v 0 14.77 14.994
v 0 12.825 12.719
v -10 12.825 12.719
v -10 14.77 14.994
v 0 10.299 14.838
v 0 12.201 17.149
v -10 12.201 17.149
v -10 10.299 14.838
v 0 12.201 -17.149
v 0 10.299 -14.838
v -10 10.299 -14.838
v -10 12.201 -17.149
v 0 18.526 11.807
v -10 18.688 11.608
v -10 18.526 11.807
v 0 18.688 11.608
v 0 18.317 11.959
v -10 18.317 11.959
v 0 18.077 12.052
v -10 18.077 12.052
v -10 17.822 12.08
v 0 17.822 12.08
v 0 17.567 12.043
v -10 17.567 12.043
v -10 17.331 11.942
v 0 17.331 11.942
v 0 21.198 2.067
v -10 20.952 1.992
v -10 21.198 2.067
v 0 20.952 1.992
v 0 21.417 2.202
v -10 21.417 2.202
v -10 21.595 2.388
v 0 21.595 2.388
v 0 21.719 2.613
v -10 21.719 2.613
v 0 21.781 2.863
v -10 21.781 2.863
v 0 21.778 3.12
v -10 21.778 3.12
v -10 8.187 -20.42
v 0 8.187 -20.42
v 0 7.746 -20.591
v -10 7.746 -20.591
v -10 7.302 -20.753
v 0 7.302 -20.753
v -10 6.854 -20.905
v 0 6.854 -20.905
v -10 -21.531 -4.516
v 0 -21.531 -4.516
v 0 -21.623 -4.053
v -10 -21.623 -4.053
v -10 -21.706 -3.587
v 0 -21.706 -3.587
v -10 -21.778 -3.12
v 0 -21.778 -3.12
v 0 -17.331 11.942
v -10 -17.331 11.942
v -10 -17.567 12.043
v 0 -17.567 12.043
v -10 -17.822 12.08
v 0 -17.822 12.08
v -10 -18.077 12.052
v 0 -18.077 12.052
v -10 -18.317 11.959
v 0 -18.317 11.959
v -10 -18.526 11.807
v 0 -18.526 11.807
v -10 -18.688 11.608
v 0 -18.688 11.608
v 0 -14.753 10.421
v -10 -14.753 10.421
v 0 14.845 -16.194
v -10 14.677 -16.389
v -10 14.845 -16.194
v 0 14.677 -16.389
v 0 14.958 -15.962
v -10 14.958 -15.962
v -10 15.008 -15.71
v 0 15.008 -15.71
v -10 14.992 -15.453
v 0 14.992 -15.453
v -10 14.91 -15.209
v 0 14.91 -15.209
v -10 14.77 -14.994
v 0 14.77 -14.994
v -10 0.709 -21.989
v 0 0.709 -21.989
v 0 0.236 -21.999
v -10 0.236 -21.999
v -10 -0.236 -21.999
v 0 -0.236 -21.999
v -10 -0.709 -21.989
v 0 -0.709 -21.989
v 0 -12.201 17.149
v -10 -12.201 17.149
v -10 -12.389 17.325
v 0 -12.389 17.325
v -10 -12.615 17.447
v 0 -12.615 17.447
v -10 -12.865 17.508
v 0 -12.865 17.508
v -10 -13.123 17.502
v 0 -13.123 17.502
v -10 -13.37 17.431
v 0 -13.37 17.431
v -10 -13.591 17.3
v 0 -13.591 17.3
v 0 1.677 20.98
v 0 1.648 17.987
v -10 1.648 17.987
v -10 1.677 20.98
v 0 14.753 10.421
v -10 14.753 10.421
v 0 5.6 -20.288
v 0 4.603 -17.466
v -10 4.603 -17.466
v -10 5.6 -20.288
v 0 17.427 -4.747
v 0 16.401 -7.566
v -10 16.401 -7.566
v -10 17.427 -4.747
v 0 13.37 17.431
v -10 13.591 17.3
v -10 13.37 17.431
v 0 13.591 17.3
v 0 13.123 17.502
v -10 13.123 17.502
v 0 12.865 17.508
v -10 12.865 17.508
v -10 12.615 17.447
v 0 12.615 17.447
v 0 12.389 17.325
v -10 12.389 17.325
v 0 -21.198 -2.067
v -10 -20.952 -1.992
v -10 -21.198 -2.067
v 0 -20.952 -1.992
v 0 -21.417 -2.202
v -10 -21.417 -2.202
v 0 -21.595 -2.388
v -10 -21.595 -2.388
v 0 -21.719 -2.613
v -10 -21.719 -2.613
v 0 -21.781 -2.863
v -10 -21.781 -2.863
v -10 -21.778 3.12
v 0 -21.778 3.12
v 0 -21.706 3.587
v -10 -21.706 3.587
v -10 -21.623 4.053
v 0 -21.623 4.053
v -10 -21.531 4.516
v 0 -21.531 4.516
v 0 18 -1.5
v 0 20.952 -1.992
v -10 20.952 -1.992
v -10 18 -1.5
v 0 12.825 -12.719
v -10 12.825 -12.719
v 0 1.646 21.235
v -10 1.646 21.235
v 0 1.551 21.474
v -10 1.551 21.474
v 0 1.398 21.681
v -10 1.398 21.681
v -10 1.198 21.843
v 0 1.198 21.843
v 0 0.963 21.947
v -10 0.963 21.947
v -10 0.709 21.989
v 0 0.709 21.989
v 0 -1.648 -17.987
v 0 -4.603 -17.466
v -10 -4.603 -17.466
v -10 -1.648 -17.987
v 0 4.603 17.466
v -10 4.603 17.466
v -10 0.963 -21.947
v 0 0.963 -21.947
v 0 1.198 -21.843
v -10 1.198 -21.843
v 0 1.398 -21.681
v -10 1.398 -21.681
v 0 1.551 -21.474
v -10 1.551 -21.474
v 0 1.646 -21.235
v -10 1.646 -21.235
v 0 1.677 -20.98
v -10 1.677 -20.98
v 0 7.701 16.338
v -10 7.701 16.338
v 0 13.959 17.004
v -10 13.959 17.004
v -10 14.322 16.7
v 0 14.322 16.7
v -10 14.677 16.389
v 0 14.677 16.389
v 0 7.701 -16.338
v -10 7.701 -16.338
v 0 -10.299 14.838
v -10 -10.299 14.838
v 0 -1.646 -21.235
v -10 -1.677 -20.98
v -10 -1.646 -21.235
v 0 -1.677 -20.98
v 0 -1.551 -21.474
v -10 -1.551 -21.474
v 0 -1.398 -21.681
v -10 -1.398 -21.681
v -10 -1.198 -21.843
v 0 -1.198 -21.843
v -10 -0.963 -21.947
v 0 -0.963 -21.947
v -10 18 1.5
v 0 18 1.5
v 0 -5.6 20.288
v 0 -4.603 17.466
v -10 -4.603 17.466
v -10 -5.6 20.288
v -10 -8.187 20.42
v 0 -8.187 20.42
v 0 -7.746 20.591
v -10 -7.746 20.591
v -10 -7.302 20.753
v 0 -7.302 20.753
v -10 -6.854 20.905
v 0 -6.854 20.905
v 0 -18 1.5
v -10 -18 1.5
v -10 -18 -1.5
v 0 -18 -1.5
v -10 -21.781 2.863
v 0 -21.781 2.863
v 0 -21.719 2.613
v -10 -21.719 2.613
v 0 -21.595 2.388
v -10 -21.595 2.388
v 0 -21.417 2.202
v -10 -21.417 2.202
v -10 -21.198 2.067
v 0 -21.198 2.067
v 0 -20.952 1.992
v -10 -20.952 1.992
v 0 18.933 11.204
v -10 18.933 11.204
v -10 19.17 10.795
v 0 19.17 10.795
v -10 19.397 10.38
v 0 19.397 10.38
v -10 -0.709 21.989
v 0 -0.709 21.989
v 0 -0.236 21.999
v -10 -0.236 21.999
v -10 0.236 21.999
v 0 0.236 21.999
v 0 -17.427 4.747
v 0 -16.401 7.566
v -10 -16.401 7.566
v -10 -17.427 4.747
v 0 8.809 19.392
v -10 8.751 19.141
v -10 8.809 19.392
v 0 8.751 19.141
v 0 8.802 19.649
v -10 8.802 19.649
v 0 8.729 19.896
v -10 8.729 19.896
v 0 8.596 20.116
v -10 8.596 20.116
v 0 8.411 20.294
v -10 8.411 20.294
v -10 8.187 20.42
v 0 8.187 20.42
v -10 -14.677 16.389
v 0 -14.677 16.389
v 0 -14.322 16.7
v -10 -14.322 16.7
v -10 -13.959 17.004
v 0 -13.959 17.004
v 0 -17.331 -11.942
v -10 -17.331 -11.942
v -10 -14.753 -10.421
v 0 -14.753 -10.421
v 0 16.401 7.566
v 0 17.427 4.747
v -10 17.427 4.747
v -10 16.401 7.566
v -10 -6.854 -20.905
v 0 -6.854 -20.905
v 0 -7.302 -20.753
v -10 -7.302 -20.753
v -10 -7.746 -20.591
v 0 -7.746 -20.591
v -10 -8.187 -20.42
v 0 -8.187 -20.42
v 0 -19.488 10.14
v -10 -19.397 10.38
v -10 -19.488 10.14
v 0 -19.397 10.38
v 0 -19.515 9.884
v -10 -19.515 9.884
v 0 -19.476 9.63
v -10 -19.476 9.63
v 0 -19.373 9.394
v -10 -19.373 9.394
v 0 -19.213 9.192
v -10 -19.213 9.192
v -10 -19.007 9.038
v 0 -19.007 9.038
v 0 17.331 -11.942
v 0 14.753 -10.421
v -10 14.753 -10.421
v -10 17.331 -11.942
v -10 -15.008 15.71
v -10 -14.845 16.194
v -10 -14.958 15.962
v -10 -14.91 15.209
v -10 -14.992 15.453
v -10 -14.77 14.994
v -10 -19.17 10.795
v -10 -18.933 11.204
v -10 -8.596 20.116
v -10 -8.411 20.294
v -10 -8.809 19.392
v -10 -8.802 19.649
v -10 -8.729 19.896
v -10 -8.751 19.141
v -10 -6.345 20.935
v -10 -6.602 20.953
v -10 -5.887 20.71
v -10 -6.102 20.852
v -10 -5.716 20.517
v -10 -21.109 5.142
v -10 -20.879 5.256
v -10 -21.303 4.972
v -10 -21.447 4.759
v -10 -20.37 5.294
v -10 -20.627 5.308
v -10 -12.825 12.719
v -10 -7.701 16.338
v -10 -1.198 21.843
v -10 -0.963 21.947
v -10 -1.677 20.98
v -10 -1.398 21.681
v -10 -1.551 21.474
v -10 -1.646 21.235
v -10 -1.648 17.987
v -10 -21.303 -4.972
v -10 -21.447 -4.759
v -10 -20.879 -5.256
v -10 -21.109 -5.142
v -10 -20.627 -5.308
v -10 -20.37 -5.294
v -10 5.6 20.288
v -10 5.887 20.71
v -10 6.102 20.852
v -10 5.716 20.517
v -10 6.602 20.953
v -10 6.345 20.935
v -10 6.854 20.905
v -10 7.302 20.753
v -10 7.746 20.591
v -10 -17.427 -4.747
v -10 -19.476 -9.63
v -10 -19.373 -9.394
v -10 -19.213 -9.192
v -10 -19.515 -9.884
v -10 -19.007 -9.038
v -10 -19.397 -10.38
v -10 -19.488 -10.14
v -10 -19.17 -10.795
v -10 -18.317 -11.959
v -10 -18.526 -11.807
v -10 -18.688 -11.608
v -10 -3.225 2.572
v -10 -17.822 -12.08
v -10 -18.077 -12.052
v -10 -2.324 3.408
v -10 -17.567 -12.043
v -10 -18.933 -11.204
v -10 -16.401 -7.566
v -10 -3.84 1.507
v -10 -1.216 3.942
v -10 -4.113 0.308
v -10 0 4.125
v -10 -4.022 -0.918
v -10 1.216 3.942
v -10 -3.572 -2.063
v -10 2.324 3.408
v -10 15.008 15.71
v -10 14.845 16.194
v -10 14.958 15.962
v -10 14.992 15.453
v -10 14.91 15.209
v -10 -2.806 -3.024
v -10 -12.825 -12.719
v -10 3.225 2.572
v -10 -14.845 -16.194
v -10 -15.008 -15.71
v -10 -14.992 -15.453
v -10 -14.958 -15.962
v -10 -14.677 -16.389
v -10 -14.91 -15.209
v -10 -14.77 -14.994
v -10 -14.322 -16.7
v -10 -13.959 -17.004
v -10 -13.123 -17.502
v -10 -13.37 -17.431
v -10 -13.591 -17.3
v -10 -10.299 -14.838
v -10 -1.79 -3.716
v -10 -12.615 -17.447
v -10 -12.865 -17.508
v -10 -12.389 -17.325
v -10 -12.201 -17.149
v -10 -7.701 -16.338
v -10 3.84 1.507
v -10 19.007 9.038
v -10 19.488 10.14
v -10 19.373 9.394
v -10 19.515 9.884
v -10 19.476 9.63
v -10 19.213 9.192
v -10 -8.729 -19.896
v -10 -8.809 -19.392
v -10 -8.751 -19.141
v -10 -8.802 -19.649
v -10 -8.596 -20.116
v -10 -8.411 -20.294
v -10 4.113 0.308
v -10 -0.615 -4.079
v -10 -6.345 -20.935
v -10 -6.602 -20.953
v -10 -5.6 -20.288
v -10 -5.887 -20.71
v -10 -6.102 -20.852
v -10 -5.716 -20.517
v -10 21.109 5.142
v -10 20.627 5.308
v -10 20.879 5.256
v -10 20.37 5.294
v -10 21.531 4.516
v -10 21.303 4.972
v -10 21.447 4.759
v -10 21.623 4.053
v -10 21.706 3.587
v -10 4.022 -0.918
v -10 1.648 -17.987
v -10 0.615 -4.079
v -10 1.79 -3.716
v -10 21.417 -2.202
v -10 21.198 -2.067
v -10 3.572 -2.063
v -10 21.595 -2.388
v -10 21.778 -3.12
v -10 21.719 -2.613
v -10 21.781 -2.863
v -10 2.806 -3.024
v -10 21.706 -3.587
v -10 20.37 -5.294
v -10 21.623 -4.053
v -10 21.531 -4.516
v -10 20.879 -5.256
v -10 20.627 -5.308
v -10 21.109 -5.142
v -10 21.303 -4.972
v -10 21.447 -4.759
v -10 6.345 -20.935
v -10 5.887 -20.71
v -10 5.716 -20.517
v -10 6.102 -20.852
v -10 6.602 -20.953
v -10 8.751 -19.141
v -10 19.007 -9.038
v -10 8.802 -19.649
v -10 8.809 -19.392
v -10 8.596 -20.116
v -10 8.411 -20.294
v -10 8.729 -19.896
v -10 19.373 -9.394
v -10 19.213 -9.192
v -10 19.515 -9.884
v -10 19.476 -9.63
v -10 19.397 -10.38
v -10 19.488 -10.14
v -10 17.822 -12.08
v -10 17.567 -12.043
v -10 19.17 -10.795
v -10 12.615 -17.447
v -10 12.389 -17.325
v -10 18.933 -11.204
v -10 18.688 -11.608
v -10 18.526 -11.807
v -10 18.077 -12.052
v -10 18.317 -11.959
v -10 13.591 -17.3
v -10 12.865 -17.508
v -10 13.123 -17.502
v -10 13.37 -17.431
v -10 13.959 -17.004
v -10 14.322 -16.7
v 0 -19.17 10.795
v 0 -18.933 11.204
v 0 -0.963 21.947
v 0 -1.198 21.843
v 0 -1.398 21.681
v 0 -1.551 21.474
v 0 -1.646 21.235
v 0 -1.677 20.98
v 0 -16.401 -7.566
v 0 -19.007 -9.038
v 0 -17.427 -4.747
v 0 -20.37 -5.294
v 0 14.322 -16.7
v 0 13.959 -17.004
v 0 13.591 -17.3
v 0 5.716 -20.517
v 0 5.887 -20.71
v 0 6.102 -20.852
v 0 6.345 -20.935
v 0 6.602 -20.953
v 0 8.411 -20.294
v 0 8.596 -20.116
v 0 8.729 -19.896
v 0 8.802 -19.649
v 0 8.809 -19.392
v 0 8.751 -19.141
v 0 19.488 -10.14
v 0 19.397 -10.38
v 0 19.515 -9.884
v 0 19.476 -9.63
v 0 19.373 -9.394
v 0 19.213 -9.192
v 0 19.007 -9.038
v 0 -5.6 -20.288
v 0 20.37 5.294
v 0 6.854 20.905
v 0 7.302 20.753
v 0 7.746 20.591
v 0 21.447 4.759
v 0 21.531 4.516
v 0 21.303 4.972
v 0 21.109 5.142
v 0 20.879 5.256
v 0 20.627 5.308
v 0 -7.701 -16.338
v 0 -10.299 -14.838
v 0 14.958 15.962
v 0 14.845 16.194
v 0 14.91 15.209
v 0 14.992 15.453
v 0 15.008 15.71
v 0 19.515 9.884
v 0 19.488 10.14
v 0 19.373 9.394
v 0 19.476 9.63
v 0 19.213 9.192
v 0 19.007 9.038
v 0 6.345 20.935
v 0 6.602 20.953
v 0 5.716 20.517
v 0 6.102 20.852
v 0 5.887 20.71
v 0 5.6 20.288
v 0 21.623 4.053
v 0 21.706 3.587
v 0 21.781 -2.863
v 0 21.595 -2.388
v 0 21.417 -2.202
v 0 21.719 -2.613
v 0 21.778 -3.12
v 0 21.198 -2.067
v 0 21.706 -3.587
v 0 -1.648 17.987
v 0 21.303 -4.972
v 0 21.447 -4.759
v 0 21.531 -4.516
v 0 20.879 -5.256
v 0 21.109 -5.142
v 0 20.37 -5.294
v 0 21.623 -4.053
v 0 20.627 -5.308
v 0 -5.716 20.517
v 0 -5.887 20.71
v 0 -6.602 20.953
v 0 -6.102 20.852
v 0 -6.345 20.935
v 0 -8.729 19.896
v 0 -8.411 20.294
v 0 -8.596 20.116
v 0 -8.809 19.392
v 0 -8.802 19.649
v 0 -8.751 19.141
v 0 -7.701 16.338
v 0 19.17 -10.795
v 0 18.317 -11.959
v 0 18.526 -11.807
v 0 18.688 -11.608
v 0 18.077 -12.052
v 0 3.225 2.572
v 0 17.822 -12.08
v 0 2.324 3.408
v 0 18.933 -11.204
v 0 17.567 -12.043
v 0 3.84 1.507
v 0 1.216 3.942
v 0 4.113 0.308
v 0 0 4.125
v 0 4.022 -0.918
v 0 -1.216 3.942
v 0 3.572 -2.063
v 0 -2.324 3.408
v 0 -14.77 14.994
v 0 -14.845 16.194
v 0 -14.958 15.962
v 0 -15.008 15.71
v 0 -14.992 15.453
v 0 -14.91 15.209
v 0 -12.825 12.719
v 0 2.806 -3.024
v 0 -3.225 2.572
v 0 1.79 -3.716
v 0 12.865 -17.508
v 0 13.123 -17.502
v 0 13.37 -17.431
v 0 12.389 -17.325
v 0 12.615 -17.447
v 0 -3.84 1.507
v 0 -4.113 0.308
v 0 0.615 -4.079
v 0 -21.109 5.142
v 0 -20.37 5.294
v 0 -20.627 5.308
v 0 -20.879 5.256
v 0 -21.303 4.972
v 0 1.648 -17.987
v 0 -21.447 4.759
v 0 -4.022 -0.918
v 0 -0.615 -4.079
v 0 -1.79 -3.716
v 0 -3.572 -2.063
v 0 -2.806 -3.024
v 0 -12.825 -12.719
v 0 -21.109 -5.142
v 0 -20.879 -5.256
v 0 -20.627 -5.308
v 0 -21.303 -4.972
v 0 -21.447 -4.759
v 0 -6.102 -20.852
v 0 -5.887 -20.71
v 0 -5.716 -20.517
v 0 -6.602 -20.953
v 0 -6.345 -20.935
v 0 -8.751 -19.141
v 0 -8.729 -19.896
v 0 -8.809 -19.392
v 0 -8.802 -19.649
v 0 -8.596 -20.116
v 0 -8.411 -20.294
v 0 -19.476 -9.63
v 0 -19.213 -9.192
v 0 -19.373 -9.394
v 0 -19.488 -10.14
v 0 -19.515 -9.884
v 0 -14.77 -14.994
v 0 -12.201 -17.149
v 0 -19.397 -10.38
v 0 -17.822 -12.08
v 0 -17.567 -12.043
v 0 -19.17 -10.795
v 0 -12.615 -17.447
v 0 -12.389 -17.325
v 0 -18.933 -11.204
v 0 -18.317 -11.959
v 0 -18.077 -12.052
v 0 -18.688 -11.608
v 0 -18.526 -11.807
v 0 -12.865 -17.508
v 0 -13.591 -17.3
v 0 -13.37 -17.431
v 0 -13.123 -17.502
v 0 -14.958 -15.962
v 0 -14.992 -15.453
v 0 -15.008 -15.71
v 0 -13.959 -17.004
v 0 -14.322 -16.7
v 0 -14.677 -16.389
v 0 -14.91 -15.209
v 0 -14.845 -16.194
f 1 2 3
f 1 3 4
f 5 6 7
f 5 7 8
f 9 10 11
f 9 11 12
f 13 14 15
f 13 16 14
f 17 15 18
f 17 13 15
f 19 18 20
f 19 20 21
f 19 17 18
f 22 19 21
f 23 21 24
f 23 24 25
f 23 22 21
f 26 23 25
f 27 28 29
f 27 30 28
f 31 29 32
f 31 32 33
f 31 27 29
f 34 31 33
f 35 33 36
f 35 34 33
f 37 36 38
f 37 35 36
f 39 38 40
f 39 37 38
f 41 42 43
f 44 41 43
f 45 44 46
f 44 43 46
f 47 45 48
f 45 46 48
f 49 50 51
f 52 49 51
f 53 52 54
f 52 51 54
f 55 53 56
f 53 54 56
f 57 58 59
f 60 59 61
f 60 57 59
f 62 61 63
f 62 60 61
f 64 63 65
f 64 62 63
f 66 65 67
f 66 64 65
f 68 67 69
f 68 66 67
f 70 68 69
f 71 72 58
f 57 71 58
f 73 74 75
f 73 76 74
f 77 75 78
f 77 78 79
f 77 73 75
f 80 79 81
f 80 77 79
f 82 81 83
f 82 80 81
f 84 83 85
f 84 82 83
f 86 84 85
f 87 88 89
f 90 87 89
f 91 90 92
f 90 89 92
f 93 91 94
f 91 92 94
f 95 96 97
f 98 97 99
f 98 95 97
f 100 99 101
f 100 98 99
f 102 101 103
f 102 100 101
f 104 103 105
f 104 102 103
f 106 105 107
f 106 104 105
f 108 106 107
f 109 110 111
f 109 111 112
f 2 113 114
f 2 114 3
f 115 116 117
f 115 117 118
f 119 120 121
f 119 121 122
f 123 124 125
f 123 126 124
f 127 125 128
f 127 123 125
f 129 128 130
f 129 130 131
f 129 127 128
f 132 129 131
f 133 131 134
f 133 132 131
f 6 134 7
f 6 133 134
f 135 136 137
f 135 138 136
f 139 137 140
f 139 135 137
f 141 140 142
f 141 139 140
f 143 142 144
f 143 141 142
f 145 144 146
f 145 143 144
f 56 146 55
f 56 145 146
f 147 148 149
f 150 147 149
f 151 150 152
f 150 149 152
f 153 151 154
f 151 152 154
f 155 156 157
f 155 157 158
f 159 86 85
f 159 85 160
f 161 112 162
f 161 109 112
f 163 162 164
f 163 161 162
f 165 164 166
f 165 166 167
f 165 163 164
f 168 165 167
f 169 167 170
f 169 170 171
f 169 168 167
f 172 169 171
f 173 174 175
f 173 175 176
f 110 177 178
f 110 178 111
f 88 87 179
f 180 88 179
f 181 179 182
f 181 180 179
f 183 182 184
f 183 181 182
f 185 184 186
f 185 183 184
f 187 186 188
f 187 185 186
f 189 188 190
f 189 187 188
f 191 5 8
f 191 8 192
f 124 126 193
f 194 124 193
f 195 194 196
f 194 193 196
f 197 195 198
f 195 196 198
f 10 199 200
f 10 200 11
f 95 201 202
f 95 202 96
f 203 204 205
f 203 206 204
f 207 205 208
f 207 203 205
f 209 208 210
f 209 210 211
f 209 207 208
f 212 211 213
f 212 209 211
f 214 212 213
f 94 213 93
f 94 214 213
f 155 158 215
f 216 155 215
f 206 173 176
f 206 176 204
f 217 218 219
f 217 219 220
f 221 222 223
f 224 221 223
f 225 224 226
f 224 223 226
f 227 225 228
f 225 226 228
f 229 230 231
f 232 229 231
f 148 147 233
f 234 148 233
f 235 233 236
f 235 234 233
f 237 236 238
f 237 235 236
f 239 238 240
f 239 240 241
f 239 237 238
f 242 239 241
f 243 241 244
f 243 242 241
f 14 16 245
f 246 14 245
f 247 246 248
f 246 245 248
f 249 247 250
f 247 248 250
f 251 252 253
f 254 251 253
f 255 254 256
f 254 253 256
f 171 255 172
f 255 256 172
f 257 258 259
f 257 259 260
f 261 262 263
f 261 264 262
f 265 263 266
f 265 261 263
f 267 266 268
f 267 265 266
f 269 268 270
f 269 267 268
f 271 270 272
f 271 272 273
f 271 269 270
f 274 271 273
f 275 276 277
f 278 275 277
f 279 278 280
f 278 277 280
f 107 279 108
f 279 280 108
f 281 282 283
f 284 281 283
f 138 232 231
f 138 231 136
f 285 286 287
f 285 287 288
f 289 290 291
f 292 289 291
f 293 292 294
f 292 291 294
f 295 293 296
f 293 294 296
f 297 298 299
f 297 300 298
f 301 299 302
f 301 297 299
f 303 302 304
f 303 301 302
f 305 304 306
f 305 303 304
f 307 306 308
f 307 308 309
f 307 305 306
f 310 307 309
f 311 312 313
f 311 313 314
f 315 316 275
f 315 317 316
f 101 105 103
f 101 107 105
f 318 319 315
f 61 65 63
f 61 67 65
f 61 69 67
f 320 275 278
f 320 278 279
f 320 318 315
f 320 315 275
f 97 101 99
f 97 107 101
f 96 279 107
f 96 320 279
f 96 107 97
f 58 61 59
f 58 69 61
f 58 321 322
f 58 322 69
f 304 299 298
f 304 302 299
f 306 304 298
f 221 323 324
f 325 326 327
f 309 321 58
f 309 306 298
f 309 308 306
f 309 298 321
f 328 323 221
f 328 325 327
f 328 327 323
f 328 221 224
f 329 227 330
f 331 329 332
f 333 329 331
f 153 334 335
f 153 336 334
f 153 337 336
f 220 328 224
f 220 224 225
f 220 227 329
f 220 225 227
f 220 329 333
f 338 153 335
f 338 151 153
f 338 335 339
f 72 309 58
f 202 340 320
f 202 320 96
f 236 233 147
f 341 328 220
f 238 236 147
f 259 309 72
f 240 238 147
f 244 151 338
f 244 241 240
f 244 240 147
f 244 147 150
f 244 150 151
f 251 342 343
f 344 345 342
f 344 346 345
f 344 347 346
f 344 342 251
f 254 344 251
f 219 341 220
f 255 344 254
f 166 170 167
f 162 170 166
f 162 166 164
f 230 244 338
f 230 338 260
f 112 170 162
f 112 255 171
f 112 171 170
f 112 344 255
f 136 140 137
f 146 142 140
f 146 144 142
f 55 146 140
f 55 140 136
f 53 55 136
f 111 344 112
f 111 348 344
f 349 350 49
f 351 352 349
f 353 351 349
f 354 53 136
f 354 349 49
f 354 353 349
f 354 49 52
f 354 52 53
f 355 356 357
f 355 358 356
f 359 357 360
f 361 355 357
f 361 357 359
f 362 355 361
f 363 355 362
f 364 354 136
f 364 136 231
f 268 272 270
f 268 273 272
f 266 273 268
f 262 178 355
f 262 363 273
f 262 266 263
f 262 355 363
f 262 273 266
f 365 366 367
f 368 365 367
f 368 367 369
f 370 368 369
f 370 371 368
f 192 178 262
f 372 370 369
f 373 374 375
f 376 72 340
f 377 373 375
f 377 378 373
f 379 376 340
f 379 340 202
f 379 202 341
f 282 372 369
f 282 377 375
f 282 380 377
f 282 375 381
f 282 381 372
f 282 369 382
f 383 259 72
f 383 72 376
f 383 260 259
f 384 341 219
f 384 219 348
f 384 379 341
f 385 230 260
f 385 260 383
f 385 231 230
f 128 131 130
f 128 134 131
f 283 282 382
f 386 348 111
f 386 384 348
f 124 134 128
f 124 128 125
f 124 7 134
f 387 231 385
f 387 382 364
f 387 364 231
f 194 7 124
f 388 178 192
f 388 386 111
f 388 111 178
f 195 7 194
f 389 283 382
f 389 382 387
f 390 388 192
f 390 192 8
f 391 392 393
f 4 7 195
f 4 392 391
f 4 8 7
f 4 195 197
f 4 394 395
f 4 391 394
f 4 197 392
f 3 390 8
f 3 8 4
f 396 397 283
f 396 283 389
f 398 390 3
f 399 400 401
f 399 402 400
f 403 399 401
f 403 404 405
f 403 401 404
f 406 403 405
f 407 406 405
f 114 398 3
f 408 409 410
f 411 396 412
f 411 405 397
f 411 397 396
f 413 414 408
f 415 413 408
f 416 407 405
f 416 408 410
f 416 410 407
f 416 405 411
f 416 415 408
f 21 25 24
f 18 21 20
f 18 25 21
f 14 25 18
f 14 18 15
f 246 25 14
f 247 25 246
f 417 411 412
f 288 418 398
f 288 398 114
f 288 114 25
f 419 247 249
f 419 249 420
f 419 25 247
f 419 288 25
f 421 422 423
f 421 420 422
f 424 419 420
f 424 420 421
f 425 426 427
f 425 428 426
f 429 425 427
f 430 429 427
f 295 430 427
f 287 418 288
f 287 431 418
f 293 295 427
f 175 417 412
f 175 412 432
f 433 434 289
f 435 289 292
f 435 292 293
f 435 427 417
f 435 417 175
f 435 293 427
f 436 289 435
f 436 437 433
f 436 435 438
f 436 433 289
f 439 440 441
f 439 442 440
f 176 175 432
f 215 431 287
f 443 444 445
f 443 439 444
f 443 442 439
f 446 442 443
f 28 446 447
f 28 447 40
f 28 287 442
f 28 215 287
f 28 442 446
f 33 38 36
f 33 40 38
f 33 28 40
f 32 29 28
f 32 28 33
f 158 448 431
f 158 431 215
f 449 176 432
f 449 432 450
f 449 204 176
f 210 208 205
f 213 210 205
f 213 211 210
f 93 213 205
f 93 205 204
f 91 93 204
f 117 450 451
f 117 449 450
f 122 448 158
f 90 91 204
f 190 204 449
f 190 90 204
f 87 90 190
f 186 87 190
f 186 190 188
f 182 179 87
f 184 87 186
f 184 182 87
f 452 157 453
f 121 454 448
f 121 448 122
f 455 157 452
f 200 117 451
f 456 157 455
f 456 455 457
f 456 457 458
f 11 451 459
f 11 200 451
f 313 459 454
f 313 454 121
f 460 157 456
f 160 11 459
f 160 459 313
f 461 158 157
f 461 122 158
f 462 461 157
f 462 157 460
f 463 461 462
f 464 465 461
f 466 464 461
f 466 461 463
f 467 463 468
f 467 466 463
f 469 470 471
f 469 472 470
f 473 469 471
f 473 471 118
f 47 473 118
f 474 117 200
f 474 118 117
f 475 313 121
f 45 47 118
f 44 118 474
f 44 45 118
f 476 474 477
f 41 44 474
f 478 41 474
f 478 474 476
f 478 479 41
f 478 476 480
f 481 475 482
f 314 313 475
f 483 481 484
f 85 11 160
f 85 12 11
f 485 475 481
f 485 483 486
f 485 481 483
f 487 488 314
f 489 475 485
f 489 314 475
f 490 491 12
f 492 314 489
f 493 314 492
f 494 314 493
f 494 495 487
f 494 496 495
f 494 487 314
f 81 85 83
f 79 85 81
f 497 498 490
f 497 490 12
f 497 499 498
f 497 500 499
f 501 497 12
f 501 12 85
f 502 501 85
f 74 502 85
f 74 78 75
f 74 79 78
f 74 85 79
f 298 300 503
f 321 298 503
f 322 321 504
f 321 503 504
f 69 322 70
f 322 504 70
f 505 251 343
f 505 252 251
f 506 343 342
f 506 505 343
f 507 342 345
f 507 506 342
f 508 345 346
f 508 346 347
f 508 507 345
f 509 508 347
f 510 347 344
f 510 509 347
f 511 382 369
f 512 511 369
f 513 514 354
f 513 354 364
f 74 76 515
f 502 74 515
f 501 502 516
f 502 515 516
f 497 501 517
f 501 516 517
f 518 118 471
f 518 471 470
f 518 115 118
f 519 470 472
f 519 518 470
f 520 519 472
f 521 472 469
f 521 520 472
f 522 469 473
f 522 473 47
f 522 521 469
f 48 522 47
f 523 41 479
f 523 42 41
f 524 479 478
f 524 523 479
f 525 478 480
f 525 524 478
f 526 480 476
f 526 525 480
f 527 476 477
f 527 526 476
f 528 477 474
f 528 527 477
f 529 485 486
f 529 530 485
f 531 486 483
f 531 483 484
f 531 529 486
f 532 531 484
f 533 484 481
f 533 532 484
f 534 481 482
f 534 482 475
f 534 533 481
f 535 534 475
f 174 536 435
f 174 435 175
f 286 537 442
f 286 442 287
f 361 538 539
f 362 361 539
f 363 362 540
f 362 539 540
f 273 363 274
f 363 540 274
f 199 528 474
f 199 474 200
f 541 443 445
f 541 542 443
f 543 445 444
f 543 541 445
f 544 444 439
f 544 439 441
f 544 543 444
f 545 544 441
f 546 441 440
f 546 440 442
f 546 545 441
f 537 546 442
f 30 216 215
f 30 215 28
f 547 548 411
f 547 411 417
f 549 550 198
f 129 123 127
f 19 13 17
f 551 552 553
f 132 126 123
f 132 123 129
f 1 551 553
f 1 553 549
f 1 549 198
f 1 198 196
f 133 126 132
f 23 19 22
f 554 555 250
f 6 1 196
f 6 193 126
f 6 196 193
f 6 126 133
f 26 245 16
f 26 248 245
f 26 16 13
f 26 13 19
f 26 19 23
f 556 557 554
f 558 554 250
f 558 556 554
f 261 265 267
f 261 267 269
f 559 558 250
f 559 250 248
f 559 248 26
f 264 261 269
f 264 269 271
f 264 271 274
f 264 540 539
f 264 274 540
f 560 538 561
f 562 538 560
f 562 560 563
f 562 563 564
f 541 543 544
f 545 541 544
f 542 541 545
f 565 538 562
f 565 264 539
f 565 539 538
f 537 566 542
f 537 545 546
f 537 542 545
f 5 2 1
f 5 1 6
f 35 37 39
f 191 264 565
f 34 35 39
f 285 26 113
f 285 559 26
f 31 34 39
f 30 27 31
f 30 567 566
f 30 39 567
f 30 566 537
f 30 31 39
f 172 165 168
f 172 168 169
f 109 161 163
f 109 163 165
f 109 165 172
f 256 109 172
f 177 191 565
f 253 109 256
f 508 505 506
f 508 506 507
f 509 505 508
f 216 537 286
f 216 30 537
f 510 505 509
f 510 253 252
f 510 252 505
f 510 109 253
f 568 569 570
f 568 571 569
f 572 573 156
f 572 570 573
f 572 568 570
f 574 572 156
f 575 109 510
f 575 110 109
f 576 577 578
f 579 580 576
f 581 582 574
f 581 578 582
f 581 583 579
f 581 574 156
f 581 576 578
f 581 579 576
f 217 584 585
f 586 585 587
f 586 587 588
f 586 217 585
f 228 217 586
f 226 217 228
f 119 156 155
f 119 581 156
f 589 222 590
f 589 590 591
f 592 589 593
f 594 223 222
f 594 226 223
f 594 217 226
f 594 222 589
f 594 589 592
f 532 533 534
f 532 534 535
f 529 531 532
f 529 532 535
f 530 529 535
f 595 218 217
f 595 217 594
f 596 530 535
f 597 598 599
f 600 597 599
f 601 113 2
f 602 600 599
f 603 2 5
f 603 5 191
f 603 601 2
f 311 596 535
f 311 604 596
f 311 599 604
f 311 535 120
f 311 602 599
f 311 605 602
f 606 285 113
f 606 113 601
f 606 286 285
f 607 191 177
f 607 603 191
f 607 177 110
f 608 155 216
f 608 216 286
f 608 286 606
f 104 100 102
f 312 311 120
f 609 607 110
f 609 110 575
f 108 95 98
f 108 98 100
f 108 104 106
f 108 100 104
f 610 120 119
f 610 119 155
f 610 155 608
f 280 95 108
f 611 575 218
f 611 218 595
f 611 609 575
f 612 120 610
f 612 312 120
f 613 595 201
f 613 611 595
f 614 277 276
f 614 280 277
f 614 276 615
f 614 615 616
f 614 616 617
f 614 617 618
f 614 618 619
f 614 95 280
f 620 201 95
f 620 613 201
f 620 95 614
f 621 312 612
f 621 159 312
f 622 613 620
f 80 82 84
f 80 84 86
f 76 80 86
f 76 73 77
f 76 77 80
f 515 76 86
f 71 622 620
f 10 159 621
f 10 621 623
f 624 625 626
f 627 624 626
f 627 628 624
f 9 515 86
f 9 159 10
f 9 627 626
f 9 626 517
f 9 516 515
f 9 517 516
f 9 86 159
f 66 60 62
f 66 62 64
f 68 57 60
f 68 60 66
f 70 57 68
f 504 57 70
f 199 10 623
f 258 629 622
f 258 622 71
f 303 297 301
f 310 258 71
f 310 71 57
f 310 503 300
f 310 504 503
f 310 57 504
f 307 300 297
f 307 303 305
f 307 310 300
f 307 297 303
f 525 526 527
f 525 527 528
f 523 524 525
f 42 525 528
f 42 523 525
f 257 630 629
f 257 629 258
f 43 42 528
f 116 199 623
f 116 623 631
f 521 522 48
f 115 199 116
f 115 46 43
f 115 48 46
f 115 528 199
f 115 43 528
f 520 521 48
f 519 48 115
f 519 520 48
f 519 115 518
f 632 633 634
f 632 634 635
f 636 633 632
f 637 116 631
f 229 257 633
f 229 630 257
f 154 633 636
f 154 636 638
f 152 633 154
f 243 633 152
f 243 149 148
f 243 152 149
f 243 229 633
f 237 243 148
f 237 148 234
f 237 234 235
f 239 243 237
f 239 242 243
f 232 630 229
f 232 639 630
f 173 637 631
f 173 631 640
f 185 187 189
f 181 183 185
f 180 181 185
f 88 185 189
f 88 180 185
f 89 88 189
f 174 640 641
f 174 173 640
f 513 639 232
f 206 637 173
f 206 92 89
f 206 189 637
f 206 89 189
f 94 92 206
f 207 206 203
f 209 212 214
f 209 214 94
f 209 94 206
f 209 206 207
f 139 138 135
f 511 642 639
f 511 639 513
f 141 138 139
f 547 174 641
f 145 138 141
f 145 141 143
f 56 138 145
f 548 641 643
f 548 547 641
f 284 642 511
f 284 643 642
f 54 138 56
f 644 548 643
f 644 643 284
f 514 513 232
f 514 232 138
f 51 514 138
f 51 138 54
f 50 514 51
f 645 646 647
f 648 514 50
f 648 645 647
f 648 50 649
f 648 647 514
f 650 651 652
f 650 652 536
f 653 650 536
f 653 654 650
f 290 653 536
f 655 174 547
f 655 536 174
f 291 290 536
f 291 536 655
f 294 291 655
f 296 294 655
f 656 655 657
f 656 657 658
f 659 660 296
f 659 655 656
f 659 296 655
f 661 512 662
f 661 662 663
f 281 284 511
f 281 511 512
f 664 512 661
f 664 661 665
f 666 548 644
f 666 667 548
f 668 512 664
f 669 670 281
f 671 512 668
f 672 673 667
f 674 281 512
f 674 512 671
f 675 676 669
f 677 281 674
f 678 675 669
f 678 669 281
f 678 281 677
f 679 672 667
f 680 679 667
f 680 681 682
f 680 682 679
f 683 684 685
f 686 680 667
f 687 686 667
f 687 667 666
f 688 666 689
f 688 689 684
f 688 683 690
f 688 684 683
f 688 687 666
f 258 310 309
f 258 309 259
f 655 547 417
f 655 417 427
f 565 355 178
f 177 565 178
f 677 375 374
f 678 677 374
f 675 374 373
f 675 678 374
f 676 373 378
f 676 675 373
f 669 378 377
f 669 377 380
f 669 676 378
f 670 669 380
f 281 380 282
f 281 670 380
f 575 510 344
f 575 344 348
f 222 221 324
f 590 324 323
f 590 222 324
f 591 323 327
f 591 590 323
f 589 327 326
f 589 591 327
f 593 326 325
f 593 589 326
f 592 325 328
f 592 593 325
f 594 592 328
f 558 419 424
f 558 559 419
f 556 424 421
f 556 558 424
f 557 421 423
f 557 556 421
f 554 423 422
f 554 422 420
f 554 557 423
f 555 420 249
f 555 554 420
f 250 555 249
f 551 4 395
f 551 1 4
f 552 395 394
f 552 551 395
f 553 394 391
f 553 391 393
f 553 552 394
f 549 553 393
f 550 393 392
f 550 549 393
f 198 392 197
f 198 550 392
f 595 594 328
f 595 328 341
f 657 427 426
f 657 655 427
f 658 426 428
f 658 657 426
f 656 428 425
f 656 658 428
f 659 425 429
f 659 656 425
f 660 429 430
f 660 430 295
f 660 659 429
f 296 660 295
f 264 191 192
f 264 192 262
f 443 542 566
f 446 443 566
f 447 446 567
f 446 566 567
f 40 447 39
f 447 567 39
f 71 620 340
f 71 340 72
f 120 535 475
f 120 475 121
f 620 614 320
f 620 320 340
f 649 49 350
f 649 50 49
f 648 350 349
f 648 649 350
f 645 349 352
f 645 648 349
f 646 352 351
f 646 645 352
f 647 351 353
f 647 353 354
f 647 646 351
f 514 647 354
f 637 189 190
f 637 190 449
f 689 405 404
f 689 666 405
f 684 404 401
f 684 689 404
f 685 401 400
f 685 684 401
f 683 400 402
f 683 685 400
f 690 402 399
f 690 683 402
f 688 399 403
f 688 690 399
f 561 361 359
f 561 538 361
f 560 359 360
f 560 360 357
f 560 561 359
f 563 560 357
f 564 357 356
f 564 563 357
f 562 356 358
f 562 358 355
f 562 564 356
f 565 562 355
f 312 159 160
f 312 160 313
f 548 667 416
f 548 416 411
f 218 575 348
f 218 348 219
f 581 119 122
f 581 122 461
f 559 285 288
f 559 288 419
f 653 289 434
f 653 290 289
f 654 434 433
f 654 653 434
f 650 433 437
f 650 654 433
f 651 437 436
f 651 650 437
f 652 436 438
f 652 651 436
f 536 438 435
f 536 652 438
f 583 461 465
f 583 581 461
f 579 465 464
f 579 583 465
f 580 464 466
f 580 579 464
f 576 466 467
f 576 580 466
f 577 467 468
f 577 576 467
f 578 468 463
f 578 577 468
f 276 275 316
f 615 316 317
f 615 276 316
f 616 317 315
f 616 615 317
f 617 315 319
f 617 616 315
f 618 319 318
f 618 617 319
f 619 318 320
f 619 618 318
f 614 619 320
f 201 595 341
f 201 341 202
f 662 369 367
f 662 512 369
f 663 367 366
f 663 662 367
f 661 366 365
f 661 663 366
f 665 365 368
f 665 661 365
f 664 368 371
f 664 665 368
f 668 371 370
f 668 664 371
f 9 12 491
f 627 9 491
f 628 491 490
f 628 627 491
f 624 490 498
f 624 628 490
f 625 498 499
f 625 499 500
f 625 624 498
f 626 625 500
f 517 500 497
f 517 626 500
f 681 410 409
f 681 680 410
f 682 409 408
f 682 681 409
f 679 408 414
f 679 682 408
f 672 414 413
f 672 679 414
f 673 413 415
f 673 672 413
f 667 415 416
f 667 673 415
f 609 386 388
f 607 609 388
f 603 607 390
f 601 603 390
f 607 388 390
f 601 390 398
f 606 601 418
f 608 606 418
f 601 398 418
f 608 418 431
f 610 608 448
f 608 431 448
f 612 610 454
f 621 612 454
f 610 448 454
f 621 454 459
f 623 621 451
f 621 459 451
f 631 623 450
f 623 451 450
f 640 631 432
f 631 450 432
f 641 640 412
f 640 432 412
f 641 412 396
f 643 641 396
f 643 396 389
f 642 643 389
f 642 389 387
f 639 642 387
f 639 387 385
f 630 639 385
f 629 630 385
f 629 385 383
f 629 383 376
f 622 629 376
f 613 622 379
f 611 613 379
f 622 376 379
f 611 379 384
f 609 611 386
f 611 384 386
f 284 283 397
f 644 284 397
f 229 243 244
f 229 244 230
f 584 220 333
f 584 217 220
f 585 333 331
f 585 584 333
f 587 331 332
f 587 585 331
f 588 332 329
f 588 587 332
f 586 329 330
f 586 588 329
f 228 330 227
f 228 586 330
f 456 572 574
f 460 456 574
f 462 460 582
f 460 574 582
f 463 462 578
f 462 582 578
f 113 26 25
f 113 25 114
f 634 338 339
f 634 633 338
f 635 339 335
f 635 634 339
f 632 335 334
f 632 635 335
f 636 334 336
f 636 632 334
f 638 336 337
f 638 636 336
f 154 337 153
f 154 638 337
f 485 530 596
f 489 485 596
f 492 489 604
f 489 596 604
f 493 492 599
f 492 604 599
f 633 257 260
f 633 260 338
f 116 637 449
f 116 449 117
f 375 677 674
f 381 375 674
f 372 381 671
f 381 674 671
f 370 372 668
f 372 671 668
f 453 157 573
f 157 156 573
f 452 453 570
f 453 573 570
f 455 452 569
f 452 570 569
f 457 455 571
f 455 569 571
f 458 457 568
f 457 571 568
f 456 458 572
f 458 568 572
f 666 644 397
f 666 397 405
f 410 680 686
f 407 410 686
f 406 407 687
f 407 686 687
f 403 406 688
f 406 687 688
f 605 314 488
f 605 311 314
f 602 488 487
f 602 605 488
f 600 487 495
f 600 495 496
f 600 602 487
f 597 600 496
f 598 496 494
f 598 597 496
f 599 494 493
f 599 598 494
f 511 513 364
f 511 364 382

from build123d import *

# Parameters (mm, degrees)
CUT_EXTRUDE1_DEPTH       = 44
FILLET1_R                = 1
CIRPATTERN1_COUNT        = 18
FILLET1_OF_CIRPATTERN1_R = 1
SKETCH4_R                = 4.125
CUT_EXTRUDE2_DEPTH       = 10


with BuildPart() as part:
    # Sketch1 → Revolve1 (revolve)
    with BuildSketch(Plane.XY):
        Polygon((0, 0), (-10, 0), (-10, 5), (-10, 12), (-10, 22), (0, 22), (0, 20), (0, 5), align=None)
    revolve(axis=Axis((0, 0, 0), (-1, 0, 0)))

    # Sketch2 → Cut-Extrude1 (cut)
    with BuildSketch(Plane(origin=(0, 0, 0), x_dir=(0, 0, -1), z_dir=(1, 0, 0))):
        Polygon((-2.5, 24), (2.5, 24), (1.5, 18), (-1.5, 18), align=None)
    cut_extrude1 = extrude(amount=-CUT_EXTRUDE1_DEPTH, mode=Mode.SUBTRACT)

    # Fillet1
    fillet1_edges = [part.edges().sort_by_distance(p)[0] for p in [
        (-5, 21.894776607, -2.149129435),
        (-5, 21.894776607, 2.149129435),
    ]]
    fillet(fillet1_edges, radius=FILLET1_R)

    # CirPattern1: Cut-Extrude1 ×18 about axis
    cirpattern1_axis = Axis((0, 0, 0), (1, 0, 0))
    for i in range(1, CIRPATTERN1_COUNT):
        add(cut_extrude1.rotate(cirpattern1_axis, i * 360 / CIRPATTERN1_COUNT), mode=Mode.SUBTRACT)

    # Fillet1 of CirPattern1
    fillet1_of_cirpattern1_edges = [part.edges().sort_by_distance(p)[0] for p in [
        (-5, 21.309405569, 5.468933563),
        (-5, 19.839314454, 9.507975704),
        (-5, 18.153805725, 12.427362459),
        (-5, 15.390938181, 15.720019781),
        (-5, 12.80858899, 17.886868035),
        (-5, 9.086187617, 20.035997469),
        (-5, 5.918467388, 21.188953343),
        (-5, 1.685508729, 21.935338163),
        (-5, -1.685508729, 21.935338163),
        (-5, -5.918467388, 21.188953343),
        (-5, -9.086187617, 20.035997469),
        (-5, -12.80858899, 17.886868035),
        (-5, -15.390938181, 15.720019781),
        (-5, -18.153805725, 12.427362459),
        (-5, -19.839314454, 9.507975704),
        (-5, -21.309405569, 5.468933563),
        (-5, -21.894776607, 2.149129435),
        (-5, -21.894776607, -2.149129435),
        (-5, -21.309405569, -5.468933563),
        (-5, -19.839314454, -9.507975704),
        (-5, -18.153805725, -12.427362459),
        (-5, -15.390938181, -15.720019781),
        (-5, -12.80858899, -17.886868035),
        (-5, -9.086187617, -20.035997469),
        (-5, -5.918467388, -21.188953343),
        (-5, -1.685508729, -21.935338163),
        (-5, 1.685508729, -21.935338163),
        (-5, 5.918467388, -21.188953343),
        (-5, 9.086187617, -20.035997469),
        (-5, 12.80858899, -17.886868035),
        (-5, 15.390938181, -15.720019781),
        (-5, 18.153805725, -12.427362459),
        (-5, 19.839314454, -9.507975704),
        (-5, 21.309405569, -5.468933563),
    ]]
    fillet(fillet1_of_cirpattern1_edges, radius=FILLET1_OF_CIRPATTERN1_R)

    # Sketch4 → Cut-Extrude2 (cut)
    with BuildSketch(Plane.ZY.offset(10)):
        Circle(SKETCH4_R)
    extrude(amount=-CUT_EXTRUDE2_DEPTH, mode=Mode.SUBTRACT)


solid = part.part
